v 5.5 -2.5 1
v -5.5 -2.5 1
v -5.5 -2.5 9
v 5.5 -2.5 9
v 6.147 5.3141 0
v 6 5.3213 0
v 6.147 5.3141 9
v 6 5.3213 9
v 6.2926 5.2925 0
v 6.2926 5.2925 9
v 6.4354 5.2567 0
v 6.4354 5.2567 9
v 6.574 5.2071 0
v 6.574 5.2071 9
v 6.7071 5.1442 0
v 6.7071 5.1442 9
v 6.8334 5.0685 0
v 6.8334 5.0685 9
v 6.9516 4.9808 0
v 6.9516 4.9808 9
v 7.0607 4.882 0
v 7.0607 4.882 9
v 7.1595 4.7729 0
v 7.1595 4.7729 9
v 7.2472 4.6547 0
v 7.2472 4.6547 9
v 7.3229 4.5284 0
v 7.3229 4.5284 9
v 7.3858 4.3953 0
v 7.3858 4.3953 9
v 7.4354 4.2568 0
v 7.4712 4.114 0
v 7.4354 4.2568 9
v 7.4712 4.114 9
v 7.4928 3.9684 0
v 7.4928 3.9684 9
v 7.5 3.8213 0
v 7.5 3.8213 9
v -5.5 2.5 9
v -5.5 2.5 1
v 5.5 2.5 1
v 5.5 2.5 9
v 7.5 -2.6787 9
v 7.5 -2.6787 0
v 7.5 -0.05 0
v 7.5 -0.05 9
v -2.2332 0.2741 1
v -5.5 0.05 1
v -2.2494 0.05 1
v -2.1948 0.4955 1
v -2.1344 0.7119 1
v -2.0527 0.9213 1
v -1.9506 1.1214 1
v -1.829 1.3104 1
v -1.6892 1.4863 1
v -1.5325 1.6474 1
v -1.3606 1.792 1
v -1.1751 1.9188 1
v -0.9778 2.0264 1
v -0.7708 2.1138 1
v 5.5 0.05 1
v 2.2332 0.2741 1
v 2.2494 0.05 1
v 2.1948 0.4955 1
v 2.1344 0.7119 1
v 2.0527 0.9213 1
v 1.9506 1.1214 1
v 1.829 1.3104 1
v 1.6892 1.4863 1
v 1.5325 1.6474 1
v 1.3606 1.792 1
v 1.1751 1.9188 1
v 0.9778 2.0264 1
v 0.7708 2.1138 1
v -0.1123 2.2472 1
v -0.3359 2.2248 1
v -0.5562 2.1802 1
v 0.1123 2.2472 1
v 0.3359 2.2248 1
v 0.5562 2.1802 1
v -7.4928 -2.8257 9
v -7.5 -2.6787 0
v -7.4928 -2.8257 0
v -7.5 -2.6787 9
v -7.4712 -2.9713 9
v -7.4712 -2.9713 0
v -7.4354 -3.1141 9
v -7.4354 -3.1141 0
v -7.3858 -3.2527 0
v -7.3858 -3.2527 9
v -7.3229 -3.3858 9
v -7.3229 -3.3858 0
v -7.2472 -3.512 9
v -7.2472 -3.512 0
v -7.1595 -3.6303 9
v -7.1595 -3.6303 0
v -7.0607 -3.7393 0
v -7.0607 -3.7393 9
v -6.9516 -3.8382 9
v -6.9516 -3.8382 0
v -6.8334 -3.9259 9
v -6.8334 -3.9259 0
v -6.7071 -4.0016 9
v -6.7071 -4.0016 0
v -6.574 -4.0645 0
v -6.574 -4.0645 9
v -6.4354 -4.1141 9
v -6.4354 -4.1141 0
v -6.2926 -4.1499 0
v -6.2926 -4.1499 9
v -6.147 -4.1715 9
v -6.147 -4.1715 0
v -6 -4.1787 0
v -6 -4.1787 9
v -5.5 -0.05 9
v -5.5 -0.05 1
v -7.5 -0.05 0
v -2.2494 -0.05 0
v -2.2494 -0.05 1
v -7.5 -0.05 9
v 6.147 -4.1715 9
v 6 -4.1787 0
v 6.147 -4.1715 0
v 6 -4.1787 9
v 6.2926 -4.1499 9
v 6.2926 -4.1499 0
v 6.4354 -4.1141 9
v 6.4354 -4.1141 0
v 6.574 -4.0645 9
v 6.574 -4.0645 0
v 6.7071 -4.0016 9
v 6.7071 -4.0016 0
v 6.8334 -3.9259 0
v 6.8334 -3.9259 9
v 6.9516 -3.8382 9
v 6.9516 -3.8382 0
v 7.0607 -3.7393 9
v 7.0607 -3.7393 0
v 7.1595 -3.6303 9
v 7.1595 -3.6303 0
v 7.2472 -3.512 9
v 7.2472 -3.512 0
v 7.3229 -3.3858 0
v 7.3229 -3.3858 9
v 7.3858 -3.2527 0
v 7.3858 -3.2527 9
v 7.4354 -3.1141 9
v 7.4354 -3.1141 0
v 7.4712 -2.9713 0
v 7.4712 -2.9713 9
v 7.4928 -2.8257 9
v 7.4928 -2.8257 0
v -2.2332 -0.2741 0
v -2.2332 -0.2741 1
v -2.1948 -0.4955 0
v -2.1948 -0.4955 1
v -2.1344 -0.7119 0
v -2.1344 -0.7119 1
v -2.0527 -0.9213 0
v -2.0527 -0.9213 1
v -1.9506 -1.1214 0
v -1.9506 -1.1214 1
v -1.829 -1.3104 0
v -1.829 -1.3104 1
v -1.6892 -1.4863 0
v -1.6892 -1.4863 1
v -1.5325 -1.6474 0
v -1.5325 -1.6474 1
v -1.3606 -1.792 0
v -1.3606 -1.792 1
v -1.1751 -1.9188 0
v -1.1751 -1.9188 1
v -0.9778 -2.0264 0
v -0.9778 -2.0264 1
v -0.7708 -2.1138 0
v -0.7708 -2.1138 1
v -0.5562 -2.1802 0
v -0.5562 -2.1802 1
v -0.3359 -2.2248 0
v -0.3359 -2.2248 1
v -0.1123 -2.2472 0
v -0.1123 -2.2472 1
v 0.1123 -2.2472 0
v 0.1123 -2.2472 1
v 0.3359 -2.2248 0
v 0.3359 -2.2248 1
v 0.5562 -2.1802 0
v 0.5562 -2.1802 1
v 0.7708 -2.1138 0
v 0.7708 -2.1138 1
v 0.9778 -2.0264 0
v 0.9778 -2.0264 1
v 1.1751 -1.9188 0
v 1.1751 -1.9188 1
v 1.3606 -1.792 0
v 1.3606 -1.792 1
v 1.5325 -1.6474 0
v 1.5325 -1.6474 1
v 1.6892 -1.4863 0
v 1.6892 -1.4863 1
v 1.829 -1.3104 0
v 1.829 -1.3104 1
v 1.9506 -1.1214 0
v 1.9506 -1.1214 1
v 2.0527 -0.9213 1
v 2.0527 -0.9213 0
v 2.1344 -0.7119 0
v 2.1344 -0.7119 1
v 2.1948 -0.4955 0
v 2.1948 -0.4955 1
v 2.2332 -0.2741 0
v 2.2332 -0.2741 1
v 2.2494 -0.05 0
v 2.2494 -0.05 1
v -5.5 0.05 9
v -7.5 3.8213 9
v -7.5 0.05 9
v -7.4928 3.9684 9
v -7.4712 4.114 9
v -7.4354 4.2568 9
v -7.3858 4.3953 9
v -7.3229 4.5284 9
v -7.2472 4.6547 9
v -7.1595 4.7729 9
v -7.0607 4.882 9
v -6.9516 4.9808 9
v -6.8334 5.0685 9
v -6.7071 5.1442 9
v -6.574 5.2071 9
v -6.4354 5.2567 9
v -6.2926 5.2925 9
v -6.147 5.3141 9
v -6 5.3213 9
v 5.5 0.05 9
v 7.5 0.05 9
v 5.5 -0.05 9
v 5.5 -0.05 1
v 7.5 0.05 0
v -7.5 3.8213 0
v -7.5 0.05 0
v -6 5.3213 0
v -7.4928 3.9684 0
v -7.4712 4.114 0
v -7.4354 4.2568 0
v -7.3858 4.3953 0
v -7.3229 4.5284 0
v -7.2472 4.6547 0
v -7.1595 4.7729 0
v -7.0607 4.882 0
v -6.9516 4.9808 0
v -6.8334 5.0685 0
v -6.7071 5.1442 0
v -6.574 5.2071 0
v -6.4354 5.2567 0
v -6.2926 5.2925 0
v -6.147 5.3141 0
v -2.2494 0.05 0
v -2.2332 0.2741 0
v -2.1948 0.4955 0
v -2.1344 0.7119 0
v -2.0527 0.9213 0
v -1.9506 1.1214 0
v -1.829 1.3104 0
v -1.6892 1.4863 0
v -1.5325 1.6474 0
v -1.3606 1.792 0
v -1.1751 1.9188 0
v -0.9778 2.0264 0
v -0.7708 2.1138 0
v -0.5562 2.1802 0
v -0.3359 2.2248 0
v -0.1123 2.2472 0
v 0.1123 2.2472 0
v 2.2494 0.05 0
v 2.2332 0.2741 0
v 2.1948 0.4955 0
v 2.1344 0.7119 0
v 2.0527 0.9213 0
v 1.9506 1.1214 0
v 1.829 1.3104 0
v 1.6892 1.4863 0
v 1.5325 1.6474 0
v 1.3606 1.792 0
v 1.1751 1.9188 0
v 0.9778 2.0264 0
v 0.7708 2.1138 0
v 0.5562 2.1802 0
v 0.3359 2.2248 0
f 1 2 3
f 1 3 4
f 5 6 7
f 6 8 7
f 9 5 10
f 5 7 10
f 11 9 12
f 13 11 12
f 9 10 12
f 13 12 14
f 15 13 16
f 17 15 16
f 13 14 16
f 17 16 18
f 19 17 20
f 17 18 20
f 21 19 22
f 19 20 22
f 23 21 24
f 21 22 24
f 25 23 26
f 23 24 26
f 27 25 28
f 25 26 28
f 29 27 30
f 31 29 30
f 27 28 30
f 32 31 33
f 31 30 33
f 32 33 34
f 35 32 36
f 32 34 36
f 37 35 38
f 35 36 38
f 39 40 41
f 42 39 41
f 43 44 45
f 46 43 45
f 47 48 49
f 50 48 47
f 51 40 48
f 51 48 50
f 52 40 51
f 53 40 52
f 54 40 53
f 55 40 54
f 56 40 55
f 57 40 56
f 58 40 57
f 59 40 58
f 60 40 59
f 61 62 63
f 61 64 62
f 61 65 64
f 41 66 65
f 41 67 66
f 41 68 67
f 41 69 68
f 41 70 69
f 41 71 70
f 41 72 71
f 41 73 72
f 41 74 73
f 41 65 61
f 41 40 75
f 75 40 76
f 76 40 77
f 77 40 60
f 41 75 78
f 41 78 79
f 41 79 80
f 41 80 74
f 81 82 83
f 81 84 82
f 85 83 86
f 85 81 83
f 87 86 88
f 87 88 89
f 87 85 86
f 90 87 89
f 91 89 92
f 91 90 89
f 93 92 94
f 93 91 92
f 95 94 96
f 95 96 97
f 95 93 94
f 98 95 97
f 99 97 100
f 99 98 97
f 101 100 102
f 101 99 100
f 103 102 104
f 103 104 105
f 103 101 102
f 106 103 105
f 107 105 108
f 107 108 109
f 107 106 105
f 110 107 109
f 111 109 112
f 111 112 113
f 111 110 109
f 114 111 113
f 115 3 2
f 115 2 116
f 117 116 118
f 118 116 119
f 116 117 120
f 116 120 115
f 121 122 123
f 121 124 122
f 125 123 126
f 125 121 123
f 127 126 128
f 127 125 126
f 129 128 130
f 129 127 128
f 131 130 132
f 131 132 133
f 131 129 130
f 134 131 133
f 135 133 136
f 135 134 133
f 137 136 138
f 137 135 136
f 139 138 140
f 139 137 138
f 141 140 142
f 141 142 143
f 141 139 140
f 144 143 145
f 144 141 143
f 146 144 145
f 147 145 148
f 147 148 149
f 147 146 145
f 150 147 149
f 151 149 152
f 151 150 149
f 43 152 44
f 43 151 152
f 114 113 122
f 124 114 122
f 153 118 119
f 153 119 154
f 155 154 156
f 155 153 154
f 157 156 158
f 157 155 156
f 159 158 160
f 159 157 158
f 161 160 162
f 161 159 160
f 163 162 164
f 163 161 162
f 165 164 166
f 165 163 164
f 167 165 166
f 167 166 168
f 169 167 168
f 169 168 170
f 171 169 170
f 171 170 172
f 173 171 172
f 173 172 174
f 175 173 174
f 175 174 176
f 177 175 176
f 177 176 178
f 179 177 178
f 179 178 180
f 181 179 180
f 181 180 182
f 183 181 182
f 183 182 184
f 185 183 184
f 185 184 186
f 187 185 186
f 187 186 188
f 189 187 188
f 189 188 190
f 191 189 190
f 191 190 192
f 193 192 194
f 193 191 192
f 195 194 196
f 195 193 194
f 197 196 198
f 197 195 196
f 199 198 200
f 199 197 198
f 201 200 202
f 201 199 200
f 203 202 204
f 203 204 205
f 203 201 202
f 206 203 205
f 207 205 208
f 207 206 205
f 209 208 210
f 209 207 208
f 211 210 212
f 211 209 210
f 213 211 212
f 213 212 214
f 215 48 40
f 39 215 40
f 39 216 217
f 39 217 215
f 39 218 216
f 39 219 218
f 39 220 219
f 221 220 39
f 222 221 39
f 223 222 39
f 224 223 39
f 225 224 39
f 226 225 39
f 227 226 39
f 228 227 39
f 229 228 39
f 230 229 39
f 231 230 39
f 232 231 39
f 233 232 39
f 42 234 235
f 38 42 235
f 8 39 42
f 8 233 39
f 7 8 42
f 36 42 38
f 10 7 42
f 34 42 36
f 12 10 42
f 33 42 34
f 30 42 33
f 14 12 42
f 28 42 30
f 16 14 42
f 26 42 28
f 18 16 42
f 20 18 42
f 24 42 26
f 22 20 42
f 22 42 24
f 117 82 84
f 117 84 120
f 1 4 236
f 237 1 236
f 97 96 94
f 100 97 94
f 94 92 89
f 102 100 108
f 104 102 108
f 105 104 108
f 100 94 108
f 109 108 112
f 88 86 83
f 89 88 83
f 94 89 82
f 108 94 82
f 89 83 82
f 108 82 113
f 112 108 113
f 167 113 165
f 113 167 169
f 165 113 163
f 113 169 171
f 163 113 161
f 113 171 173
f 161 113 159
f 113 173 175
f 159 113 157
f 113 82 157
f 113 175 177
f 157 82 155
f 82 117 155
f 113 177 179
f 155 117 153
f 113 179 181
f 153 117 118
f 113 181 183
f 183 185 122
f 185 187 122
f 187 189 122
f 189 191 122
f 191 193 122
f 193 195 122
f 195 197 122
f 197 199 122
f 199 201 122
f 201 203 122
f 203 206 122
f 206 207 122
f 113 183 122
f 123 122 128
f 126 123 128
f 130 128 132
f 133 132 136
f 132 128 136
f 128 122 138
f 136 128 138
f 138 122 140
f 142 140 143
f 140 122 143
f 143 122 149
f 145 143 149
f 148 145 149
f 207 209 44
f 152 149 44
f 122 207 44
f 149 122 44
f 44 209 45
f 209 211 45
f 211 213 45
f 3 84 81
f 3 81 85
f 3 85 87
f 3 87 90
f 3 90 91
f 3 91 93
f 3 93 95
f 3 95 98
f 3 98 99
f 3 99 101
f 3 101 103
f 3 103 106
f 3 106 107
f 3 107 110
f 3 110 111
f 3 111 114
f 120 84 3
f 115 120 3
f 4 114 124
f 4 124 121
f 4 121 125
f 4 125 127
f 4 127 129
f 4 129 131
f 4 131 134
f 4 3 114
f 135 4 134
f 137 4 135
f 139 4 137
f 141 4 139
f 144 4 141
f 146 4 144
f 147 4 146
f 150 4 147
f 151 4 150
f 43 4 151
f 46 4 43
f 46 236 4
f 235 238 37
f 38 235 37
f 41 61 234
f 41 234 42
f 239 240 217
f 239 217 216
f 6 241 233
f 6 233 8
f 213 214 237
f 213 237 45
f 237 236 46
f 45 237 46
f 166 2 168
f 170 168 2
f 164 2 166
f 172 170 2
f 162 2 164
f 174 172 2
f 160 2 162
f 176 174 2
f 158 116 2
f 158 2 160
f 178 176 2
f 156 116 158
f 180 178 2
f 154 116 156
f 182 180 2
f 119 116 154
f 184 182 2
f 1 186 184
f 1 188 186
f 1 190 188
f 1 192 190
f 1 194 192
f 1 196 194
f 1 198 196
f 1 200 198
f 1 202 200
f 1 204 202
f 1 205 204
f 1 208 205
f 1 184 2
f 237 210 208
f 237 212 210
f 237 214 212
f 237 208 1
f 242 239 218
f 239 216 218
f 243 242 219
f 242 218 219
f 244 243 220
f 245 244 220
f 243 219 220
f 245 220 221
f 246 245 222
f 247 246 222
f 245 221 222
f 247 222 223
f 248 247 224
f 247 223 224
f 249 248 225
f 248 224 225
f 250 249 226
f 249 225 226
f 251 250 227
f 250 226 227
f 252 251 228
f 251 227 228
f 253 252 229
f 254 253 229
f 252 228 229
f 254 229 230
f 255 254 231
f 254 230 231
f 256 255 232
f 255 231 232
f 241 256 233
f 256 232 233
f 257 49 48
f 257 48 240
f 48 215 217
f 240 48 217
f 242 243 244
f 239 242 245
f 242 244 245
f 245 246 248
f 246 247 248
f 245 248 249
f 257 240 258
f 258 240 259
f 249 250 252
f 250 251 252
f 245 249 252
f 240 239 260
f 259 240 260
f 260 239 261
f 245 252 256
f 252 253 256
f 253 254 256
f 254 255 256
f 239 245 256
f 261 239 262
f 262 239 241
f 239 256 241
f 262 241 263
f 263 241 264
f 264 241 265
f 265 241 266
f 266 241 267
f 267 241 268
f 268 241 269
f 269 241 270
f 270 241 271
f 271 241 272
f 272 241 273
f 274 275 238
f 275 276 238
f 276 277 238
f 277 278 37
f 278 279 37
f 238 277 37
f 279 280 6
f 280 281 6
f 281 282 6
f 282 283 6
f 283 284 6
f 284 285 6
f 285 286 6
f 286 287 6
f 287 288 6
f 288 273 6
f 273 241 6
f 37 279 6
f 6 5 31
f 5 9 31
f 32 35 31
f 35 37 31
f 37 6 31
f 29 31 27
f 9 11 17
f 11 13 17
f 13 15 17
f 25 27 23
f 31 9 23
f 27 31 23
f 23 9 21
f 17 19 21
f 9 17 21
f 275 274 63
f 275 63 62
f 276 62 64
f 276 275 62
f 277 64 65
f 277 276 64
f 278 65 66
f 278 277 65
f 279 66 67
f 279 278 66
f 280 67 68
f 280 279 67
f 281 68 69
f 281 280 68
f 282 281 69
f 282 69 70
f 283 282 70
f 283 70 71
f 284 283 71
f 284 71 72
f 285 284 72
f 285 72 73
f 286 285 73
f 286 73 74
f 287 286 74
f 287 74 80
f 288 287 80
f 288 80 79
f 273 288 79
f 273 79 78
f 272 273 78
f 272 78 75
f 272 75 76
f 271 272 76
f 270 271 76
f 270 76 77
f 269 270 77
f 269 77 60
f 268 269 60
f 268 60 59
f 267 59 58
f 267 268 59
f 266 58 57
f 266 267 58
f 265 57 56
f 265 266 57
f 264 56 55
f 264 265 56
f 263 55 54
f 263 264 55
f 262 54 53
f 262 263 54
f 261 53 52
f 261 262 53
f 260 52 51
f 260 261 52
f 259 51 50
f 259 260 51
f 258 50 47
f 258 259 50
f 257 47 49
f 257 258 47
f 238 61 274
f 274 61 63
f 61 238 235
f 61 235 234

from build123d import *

# Parameters (mm, degrees)
F0_W     = 15
F0_H     = 9.5
F0_W_2   = 11
F0_H_2   = 5
F1_DEPTH = 9
F2_R     = 1.5
F0_R     = 2.25
F3_DEPTH = 1
F4_W     = 2
F4_H     = 0.1
F4_W_2   = 11
F5_DEPTH = 25


# Not quite as in the source:
# - a feature names something its author has since deleted; it is built from what else it names


with BuildPart() as f1:
    # F0 (on Top) → F1 (new body)
    with BuildSketch(Plane.XY):
        with Locations((0, 0.571324781)):
            Rectangle(F0_W, F0_H)
        Rectangle(F0_W_2, F0_H_2, mode=Mode.SUBTRACT)
    extrude(amount=F1_DEPTH)

    # F2
    f2_edges = [f1.edges().sort_by_distance(p)[0] for p in [
        (-7.5, 5.321325, 4.5),
        (7.5, 5.321325, 4.5),
        (7.5, -4.178675, 4.5),
        (-7.5, -4.178675, 4.5),
    ]]
    fillet(f2_edges, radius=F2_R)

    # F0 (on Top) → F3 (join)
    with BuildSketch(Plane.XY):
        Rectangle(F0_W_2, F0_H_2)
        Circle(F0_R, mode=Mode.SUBTRACT)
    extrude(amount=F3_DEPTH)

    # F4 (on face) → F5 (cut)
    with BuildSketch(Plane.XY.offset(9)):
        with Locations((-6.5, 0)):
            Rectangle(F4_W, F4_H)
        Rectangle(F4_W_2, F4_H)
        with Locations((6.5, 0)):
            Rectangle(F4_W, F4_H)
    extrude(amount=-F5_DEPTH, mode=Mode.SUBTRACT)


solid = f1.part
